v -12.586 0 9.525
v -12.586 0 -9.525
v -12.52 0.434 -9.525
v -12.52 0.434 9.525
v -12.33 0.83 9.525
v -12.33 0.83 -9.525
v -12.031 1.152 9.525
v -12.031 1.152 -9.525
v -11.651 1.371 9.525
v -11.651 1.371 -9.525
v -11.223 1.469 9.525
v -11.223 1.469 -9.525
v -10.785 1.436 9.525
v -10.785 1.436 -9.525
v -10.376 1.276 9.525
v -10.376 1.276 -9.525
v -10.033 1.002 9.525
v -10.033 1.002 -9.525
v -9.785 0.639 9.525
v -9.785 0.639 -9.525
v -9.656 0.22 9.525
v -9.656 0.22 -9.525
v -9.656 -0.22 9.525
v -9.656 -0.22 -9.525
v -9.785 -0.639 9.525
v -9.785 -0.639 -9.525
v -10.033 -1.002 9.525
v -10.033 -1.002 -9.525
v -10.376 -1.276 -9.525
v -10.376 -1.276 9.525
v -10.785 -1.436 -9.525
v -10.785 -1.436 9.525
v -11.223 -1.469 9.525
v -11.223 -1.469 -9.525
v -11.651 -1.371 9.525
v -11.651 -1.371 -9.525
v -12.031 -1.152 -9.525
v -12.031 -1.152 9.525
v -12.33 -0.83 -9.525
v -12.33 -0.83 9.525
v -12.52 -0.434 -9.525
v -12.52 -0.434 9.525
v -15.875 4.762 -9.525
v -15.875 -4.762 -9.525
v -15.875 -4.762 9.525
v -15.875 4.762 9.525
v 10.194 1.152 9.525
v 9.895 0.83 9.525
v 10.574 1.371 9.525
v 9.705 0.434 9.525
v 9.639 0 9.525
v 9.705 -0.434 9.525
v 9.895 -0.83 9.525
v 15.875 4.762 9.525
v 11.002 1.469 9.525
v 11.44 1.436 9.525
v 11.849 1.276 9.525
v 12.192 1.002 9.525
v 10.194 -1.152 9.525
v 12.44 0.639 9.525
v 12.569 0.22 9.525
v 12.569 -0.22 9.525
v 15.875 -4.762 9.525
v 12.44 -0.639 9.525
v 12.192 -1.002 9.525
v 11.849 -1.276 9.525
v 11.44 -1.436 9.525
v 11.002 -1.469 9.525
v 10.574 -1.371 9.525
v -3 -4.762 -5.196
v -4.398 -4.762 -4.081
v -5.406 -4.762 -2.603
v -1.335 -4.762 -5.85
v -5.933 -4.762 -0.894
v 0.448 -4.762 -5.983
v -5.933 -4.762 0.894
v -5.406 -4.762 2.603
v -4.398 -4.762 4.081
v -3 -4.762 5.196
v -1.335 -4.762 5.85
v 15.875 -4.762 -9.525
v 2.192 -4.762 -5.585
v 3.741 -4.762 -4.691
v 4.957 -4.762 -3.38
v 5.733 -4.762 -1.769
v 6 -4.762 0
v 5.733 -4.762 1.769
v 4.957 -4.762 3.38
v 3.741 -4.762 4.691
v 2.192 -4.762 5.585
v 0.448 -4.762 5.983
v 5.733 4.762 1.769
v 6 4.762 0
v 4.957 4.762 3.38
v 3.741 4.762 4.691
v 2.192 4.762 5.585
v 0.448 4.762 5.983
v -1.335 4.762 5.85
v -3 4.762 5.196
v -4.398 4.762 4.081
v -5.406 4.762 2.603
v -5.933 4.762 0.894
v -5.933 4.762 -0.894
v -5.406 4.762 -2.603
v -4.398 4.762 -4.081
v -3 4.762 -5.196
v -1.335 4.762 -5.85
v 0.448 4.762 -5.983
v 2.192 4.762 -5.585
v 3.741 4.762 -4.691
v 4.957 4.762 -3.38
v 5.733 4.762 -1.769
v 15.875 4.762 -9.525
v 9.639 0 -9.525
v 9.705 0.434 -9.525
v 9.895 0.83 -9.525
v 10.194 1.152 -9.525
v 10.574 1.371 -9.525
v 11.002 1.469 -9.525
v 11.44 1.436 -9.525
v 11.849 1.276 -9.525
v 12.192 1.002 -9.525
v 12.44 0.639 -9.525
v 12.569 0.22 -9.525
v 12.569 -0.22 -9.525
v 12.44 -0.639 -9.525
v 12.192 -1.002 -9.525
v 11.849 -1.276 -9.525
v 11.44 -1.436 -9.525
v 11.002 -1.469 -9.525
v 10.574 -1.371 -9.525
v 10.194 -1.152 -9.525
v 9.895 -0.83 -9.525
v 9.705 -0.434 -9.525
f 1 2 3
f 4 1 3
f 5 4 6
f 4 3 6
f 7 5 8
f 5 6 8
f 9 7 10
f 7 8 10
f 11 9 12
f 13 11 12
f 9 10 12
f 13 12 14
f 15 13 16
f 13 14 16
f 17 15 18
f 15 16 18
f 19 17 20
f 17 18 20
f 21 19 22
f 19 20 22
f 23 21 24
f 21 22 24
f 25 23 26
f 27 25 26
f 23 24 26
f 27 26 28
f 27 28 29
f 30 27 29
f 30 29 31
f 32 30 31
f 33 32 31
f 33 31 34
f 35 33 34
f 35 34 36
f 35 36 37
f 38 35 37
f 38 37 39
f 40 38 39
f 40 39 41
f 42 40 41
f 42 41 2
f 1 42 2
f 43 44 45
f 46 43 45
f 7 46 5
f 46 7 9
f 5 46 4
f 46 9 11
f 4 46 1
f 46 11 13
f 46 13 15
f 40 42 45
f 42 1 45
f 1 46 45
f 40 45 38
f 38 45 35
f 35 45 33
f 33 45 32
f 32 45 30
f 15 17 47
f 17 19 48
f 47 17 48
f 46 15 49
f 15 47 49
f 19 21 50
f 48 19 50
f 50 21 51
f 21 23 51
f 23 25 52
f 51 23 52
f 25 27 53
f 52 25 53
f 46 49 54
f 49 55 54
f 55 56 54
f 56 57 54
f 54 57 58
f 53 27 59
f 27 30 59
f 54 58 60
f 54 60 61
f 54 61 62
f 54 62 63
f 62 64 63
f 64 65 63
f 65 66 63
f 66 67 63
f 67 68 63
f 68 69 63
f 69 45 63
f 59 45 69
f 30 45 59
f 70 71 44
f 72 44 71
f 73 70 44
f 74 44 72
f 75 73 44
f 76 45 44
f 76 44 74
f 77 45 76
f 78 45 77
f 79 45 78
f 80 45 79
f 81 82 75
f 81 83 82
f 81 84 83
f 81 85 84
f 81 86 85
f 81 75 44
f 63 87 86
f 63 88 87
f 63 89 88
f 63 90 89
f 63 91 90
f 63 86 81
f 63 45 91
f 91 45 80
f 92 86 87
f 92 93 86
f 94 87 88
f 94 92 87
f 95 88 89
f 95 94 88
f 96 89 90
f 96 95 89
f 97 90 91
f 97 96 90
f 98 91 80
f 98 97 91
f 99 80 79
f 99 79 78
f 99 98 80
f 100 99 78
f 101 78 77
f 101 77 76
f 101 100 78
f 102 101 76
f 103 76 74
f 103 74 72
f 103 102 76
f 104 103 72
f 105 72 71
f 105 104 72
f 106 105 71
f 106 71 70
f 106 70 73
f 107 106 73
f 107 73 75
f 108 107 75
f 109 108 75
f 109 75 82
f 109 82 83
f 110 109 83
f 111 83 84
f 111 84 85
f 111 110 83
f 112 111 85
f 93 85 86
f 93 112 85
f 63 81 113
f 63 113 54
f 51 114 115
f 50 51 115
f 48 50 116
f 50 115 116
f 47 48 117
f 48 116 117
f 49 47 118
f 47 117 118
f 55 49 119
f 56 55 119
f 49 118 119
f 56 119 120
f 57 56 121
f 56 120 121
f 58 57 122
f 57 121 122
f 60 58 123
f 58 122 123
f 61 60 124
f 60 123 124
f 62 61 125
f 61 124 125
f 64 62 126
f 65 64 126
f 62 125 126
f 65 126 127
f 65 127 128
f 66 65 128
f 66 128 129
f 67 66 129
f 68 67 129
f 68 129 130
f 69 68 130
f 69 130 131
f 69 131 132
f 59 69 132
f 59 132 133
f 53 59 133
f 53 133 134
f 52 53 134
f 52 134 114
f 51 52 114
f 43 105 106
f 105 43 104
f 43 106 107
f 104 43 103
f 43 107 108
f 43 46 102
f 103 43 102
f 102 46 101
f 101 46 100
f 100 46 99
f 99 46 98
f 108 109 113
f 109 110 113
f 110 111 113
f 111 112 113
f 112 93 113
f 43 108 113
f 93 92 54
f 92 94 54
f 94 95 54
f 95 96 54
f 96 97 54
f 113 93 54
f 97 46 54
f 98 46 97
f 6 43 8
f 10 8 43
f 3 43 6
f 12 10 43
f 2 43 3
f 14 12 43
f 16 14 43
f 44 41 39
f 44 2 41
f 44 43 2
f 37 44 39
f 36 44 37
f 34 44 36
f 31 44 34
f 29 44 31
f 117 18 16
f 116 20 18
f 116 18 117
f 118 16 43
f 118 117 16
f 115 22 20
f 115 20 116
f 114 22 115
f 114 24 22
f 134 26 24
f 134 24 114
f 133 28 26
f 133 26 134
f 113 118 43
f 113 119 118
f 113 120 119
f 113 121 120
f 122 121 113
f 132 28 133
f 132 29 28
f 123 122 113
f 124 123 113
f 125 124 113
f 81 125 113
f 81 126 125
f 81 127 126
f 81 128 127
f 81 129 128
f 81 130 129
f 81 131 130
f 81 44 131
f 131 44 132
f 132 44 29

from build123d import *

# Parameters (mm, degrees)
F0_W     = 31.75
F0_H     = 19.05
F0_R     = 6
F1_DEPTH = 4.7625
F3_D     = 2.9464


with BuildPart() as f1:
    # F0 (on Front) → F1 (new body, symmetric)
    with BuildSketch(Plane.XZ):
        Rectangle(F0_W, F0_H)
        Circle(F0_R, mode=Mode.SUBTRACT)
    extrude(amount=F1_DEPTH, both=True)

    # F3 (through all)
    with Locations(Plane.XY.offset(9.525)):
        with Locations((-11.1125, 0), (11.1125, 0)):
            Hole(F3_D / 2)


solid = f1.part
